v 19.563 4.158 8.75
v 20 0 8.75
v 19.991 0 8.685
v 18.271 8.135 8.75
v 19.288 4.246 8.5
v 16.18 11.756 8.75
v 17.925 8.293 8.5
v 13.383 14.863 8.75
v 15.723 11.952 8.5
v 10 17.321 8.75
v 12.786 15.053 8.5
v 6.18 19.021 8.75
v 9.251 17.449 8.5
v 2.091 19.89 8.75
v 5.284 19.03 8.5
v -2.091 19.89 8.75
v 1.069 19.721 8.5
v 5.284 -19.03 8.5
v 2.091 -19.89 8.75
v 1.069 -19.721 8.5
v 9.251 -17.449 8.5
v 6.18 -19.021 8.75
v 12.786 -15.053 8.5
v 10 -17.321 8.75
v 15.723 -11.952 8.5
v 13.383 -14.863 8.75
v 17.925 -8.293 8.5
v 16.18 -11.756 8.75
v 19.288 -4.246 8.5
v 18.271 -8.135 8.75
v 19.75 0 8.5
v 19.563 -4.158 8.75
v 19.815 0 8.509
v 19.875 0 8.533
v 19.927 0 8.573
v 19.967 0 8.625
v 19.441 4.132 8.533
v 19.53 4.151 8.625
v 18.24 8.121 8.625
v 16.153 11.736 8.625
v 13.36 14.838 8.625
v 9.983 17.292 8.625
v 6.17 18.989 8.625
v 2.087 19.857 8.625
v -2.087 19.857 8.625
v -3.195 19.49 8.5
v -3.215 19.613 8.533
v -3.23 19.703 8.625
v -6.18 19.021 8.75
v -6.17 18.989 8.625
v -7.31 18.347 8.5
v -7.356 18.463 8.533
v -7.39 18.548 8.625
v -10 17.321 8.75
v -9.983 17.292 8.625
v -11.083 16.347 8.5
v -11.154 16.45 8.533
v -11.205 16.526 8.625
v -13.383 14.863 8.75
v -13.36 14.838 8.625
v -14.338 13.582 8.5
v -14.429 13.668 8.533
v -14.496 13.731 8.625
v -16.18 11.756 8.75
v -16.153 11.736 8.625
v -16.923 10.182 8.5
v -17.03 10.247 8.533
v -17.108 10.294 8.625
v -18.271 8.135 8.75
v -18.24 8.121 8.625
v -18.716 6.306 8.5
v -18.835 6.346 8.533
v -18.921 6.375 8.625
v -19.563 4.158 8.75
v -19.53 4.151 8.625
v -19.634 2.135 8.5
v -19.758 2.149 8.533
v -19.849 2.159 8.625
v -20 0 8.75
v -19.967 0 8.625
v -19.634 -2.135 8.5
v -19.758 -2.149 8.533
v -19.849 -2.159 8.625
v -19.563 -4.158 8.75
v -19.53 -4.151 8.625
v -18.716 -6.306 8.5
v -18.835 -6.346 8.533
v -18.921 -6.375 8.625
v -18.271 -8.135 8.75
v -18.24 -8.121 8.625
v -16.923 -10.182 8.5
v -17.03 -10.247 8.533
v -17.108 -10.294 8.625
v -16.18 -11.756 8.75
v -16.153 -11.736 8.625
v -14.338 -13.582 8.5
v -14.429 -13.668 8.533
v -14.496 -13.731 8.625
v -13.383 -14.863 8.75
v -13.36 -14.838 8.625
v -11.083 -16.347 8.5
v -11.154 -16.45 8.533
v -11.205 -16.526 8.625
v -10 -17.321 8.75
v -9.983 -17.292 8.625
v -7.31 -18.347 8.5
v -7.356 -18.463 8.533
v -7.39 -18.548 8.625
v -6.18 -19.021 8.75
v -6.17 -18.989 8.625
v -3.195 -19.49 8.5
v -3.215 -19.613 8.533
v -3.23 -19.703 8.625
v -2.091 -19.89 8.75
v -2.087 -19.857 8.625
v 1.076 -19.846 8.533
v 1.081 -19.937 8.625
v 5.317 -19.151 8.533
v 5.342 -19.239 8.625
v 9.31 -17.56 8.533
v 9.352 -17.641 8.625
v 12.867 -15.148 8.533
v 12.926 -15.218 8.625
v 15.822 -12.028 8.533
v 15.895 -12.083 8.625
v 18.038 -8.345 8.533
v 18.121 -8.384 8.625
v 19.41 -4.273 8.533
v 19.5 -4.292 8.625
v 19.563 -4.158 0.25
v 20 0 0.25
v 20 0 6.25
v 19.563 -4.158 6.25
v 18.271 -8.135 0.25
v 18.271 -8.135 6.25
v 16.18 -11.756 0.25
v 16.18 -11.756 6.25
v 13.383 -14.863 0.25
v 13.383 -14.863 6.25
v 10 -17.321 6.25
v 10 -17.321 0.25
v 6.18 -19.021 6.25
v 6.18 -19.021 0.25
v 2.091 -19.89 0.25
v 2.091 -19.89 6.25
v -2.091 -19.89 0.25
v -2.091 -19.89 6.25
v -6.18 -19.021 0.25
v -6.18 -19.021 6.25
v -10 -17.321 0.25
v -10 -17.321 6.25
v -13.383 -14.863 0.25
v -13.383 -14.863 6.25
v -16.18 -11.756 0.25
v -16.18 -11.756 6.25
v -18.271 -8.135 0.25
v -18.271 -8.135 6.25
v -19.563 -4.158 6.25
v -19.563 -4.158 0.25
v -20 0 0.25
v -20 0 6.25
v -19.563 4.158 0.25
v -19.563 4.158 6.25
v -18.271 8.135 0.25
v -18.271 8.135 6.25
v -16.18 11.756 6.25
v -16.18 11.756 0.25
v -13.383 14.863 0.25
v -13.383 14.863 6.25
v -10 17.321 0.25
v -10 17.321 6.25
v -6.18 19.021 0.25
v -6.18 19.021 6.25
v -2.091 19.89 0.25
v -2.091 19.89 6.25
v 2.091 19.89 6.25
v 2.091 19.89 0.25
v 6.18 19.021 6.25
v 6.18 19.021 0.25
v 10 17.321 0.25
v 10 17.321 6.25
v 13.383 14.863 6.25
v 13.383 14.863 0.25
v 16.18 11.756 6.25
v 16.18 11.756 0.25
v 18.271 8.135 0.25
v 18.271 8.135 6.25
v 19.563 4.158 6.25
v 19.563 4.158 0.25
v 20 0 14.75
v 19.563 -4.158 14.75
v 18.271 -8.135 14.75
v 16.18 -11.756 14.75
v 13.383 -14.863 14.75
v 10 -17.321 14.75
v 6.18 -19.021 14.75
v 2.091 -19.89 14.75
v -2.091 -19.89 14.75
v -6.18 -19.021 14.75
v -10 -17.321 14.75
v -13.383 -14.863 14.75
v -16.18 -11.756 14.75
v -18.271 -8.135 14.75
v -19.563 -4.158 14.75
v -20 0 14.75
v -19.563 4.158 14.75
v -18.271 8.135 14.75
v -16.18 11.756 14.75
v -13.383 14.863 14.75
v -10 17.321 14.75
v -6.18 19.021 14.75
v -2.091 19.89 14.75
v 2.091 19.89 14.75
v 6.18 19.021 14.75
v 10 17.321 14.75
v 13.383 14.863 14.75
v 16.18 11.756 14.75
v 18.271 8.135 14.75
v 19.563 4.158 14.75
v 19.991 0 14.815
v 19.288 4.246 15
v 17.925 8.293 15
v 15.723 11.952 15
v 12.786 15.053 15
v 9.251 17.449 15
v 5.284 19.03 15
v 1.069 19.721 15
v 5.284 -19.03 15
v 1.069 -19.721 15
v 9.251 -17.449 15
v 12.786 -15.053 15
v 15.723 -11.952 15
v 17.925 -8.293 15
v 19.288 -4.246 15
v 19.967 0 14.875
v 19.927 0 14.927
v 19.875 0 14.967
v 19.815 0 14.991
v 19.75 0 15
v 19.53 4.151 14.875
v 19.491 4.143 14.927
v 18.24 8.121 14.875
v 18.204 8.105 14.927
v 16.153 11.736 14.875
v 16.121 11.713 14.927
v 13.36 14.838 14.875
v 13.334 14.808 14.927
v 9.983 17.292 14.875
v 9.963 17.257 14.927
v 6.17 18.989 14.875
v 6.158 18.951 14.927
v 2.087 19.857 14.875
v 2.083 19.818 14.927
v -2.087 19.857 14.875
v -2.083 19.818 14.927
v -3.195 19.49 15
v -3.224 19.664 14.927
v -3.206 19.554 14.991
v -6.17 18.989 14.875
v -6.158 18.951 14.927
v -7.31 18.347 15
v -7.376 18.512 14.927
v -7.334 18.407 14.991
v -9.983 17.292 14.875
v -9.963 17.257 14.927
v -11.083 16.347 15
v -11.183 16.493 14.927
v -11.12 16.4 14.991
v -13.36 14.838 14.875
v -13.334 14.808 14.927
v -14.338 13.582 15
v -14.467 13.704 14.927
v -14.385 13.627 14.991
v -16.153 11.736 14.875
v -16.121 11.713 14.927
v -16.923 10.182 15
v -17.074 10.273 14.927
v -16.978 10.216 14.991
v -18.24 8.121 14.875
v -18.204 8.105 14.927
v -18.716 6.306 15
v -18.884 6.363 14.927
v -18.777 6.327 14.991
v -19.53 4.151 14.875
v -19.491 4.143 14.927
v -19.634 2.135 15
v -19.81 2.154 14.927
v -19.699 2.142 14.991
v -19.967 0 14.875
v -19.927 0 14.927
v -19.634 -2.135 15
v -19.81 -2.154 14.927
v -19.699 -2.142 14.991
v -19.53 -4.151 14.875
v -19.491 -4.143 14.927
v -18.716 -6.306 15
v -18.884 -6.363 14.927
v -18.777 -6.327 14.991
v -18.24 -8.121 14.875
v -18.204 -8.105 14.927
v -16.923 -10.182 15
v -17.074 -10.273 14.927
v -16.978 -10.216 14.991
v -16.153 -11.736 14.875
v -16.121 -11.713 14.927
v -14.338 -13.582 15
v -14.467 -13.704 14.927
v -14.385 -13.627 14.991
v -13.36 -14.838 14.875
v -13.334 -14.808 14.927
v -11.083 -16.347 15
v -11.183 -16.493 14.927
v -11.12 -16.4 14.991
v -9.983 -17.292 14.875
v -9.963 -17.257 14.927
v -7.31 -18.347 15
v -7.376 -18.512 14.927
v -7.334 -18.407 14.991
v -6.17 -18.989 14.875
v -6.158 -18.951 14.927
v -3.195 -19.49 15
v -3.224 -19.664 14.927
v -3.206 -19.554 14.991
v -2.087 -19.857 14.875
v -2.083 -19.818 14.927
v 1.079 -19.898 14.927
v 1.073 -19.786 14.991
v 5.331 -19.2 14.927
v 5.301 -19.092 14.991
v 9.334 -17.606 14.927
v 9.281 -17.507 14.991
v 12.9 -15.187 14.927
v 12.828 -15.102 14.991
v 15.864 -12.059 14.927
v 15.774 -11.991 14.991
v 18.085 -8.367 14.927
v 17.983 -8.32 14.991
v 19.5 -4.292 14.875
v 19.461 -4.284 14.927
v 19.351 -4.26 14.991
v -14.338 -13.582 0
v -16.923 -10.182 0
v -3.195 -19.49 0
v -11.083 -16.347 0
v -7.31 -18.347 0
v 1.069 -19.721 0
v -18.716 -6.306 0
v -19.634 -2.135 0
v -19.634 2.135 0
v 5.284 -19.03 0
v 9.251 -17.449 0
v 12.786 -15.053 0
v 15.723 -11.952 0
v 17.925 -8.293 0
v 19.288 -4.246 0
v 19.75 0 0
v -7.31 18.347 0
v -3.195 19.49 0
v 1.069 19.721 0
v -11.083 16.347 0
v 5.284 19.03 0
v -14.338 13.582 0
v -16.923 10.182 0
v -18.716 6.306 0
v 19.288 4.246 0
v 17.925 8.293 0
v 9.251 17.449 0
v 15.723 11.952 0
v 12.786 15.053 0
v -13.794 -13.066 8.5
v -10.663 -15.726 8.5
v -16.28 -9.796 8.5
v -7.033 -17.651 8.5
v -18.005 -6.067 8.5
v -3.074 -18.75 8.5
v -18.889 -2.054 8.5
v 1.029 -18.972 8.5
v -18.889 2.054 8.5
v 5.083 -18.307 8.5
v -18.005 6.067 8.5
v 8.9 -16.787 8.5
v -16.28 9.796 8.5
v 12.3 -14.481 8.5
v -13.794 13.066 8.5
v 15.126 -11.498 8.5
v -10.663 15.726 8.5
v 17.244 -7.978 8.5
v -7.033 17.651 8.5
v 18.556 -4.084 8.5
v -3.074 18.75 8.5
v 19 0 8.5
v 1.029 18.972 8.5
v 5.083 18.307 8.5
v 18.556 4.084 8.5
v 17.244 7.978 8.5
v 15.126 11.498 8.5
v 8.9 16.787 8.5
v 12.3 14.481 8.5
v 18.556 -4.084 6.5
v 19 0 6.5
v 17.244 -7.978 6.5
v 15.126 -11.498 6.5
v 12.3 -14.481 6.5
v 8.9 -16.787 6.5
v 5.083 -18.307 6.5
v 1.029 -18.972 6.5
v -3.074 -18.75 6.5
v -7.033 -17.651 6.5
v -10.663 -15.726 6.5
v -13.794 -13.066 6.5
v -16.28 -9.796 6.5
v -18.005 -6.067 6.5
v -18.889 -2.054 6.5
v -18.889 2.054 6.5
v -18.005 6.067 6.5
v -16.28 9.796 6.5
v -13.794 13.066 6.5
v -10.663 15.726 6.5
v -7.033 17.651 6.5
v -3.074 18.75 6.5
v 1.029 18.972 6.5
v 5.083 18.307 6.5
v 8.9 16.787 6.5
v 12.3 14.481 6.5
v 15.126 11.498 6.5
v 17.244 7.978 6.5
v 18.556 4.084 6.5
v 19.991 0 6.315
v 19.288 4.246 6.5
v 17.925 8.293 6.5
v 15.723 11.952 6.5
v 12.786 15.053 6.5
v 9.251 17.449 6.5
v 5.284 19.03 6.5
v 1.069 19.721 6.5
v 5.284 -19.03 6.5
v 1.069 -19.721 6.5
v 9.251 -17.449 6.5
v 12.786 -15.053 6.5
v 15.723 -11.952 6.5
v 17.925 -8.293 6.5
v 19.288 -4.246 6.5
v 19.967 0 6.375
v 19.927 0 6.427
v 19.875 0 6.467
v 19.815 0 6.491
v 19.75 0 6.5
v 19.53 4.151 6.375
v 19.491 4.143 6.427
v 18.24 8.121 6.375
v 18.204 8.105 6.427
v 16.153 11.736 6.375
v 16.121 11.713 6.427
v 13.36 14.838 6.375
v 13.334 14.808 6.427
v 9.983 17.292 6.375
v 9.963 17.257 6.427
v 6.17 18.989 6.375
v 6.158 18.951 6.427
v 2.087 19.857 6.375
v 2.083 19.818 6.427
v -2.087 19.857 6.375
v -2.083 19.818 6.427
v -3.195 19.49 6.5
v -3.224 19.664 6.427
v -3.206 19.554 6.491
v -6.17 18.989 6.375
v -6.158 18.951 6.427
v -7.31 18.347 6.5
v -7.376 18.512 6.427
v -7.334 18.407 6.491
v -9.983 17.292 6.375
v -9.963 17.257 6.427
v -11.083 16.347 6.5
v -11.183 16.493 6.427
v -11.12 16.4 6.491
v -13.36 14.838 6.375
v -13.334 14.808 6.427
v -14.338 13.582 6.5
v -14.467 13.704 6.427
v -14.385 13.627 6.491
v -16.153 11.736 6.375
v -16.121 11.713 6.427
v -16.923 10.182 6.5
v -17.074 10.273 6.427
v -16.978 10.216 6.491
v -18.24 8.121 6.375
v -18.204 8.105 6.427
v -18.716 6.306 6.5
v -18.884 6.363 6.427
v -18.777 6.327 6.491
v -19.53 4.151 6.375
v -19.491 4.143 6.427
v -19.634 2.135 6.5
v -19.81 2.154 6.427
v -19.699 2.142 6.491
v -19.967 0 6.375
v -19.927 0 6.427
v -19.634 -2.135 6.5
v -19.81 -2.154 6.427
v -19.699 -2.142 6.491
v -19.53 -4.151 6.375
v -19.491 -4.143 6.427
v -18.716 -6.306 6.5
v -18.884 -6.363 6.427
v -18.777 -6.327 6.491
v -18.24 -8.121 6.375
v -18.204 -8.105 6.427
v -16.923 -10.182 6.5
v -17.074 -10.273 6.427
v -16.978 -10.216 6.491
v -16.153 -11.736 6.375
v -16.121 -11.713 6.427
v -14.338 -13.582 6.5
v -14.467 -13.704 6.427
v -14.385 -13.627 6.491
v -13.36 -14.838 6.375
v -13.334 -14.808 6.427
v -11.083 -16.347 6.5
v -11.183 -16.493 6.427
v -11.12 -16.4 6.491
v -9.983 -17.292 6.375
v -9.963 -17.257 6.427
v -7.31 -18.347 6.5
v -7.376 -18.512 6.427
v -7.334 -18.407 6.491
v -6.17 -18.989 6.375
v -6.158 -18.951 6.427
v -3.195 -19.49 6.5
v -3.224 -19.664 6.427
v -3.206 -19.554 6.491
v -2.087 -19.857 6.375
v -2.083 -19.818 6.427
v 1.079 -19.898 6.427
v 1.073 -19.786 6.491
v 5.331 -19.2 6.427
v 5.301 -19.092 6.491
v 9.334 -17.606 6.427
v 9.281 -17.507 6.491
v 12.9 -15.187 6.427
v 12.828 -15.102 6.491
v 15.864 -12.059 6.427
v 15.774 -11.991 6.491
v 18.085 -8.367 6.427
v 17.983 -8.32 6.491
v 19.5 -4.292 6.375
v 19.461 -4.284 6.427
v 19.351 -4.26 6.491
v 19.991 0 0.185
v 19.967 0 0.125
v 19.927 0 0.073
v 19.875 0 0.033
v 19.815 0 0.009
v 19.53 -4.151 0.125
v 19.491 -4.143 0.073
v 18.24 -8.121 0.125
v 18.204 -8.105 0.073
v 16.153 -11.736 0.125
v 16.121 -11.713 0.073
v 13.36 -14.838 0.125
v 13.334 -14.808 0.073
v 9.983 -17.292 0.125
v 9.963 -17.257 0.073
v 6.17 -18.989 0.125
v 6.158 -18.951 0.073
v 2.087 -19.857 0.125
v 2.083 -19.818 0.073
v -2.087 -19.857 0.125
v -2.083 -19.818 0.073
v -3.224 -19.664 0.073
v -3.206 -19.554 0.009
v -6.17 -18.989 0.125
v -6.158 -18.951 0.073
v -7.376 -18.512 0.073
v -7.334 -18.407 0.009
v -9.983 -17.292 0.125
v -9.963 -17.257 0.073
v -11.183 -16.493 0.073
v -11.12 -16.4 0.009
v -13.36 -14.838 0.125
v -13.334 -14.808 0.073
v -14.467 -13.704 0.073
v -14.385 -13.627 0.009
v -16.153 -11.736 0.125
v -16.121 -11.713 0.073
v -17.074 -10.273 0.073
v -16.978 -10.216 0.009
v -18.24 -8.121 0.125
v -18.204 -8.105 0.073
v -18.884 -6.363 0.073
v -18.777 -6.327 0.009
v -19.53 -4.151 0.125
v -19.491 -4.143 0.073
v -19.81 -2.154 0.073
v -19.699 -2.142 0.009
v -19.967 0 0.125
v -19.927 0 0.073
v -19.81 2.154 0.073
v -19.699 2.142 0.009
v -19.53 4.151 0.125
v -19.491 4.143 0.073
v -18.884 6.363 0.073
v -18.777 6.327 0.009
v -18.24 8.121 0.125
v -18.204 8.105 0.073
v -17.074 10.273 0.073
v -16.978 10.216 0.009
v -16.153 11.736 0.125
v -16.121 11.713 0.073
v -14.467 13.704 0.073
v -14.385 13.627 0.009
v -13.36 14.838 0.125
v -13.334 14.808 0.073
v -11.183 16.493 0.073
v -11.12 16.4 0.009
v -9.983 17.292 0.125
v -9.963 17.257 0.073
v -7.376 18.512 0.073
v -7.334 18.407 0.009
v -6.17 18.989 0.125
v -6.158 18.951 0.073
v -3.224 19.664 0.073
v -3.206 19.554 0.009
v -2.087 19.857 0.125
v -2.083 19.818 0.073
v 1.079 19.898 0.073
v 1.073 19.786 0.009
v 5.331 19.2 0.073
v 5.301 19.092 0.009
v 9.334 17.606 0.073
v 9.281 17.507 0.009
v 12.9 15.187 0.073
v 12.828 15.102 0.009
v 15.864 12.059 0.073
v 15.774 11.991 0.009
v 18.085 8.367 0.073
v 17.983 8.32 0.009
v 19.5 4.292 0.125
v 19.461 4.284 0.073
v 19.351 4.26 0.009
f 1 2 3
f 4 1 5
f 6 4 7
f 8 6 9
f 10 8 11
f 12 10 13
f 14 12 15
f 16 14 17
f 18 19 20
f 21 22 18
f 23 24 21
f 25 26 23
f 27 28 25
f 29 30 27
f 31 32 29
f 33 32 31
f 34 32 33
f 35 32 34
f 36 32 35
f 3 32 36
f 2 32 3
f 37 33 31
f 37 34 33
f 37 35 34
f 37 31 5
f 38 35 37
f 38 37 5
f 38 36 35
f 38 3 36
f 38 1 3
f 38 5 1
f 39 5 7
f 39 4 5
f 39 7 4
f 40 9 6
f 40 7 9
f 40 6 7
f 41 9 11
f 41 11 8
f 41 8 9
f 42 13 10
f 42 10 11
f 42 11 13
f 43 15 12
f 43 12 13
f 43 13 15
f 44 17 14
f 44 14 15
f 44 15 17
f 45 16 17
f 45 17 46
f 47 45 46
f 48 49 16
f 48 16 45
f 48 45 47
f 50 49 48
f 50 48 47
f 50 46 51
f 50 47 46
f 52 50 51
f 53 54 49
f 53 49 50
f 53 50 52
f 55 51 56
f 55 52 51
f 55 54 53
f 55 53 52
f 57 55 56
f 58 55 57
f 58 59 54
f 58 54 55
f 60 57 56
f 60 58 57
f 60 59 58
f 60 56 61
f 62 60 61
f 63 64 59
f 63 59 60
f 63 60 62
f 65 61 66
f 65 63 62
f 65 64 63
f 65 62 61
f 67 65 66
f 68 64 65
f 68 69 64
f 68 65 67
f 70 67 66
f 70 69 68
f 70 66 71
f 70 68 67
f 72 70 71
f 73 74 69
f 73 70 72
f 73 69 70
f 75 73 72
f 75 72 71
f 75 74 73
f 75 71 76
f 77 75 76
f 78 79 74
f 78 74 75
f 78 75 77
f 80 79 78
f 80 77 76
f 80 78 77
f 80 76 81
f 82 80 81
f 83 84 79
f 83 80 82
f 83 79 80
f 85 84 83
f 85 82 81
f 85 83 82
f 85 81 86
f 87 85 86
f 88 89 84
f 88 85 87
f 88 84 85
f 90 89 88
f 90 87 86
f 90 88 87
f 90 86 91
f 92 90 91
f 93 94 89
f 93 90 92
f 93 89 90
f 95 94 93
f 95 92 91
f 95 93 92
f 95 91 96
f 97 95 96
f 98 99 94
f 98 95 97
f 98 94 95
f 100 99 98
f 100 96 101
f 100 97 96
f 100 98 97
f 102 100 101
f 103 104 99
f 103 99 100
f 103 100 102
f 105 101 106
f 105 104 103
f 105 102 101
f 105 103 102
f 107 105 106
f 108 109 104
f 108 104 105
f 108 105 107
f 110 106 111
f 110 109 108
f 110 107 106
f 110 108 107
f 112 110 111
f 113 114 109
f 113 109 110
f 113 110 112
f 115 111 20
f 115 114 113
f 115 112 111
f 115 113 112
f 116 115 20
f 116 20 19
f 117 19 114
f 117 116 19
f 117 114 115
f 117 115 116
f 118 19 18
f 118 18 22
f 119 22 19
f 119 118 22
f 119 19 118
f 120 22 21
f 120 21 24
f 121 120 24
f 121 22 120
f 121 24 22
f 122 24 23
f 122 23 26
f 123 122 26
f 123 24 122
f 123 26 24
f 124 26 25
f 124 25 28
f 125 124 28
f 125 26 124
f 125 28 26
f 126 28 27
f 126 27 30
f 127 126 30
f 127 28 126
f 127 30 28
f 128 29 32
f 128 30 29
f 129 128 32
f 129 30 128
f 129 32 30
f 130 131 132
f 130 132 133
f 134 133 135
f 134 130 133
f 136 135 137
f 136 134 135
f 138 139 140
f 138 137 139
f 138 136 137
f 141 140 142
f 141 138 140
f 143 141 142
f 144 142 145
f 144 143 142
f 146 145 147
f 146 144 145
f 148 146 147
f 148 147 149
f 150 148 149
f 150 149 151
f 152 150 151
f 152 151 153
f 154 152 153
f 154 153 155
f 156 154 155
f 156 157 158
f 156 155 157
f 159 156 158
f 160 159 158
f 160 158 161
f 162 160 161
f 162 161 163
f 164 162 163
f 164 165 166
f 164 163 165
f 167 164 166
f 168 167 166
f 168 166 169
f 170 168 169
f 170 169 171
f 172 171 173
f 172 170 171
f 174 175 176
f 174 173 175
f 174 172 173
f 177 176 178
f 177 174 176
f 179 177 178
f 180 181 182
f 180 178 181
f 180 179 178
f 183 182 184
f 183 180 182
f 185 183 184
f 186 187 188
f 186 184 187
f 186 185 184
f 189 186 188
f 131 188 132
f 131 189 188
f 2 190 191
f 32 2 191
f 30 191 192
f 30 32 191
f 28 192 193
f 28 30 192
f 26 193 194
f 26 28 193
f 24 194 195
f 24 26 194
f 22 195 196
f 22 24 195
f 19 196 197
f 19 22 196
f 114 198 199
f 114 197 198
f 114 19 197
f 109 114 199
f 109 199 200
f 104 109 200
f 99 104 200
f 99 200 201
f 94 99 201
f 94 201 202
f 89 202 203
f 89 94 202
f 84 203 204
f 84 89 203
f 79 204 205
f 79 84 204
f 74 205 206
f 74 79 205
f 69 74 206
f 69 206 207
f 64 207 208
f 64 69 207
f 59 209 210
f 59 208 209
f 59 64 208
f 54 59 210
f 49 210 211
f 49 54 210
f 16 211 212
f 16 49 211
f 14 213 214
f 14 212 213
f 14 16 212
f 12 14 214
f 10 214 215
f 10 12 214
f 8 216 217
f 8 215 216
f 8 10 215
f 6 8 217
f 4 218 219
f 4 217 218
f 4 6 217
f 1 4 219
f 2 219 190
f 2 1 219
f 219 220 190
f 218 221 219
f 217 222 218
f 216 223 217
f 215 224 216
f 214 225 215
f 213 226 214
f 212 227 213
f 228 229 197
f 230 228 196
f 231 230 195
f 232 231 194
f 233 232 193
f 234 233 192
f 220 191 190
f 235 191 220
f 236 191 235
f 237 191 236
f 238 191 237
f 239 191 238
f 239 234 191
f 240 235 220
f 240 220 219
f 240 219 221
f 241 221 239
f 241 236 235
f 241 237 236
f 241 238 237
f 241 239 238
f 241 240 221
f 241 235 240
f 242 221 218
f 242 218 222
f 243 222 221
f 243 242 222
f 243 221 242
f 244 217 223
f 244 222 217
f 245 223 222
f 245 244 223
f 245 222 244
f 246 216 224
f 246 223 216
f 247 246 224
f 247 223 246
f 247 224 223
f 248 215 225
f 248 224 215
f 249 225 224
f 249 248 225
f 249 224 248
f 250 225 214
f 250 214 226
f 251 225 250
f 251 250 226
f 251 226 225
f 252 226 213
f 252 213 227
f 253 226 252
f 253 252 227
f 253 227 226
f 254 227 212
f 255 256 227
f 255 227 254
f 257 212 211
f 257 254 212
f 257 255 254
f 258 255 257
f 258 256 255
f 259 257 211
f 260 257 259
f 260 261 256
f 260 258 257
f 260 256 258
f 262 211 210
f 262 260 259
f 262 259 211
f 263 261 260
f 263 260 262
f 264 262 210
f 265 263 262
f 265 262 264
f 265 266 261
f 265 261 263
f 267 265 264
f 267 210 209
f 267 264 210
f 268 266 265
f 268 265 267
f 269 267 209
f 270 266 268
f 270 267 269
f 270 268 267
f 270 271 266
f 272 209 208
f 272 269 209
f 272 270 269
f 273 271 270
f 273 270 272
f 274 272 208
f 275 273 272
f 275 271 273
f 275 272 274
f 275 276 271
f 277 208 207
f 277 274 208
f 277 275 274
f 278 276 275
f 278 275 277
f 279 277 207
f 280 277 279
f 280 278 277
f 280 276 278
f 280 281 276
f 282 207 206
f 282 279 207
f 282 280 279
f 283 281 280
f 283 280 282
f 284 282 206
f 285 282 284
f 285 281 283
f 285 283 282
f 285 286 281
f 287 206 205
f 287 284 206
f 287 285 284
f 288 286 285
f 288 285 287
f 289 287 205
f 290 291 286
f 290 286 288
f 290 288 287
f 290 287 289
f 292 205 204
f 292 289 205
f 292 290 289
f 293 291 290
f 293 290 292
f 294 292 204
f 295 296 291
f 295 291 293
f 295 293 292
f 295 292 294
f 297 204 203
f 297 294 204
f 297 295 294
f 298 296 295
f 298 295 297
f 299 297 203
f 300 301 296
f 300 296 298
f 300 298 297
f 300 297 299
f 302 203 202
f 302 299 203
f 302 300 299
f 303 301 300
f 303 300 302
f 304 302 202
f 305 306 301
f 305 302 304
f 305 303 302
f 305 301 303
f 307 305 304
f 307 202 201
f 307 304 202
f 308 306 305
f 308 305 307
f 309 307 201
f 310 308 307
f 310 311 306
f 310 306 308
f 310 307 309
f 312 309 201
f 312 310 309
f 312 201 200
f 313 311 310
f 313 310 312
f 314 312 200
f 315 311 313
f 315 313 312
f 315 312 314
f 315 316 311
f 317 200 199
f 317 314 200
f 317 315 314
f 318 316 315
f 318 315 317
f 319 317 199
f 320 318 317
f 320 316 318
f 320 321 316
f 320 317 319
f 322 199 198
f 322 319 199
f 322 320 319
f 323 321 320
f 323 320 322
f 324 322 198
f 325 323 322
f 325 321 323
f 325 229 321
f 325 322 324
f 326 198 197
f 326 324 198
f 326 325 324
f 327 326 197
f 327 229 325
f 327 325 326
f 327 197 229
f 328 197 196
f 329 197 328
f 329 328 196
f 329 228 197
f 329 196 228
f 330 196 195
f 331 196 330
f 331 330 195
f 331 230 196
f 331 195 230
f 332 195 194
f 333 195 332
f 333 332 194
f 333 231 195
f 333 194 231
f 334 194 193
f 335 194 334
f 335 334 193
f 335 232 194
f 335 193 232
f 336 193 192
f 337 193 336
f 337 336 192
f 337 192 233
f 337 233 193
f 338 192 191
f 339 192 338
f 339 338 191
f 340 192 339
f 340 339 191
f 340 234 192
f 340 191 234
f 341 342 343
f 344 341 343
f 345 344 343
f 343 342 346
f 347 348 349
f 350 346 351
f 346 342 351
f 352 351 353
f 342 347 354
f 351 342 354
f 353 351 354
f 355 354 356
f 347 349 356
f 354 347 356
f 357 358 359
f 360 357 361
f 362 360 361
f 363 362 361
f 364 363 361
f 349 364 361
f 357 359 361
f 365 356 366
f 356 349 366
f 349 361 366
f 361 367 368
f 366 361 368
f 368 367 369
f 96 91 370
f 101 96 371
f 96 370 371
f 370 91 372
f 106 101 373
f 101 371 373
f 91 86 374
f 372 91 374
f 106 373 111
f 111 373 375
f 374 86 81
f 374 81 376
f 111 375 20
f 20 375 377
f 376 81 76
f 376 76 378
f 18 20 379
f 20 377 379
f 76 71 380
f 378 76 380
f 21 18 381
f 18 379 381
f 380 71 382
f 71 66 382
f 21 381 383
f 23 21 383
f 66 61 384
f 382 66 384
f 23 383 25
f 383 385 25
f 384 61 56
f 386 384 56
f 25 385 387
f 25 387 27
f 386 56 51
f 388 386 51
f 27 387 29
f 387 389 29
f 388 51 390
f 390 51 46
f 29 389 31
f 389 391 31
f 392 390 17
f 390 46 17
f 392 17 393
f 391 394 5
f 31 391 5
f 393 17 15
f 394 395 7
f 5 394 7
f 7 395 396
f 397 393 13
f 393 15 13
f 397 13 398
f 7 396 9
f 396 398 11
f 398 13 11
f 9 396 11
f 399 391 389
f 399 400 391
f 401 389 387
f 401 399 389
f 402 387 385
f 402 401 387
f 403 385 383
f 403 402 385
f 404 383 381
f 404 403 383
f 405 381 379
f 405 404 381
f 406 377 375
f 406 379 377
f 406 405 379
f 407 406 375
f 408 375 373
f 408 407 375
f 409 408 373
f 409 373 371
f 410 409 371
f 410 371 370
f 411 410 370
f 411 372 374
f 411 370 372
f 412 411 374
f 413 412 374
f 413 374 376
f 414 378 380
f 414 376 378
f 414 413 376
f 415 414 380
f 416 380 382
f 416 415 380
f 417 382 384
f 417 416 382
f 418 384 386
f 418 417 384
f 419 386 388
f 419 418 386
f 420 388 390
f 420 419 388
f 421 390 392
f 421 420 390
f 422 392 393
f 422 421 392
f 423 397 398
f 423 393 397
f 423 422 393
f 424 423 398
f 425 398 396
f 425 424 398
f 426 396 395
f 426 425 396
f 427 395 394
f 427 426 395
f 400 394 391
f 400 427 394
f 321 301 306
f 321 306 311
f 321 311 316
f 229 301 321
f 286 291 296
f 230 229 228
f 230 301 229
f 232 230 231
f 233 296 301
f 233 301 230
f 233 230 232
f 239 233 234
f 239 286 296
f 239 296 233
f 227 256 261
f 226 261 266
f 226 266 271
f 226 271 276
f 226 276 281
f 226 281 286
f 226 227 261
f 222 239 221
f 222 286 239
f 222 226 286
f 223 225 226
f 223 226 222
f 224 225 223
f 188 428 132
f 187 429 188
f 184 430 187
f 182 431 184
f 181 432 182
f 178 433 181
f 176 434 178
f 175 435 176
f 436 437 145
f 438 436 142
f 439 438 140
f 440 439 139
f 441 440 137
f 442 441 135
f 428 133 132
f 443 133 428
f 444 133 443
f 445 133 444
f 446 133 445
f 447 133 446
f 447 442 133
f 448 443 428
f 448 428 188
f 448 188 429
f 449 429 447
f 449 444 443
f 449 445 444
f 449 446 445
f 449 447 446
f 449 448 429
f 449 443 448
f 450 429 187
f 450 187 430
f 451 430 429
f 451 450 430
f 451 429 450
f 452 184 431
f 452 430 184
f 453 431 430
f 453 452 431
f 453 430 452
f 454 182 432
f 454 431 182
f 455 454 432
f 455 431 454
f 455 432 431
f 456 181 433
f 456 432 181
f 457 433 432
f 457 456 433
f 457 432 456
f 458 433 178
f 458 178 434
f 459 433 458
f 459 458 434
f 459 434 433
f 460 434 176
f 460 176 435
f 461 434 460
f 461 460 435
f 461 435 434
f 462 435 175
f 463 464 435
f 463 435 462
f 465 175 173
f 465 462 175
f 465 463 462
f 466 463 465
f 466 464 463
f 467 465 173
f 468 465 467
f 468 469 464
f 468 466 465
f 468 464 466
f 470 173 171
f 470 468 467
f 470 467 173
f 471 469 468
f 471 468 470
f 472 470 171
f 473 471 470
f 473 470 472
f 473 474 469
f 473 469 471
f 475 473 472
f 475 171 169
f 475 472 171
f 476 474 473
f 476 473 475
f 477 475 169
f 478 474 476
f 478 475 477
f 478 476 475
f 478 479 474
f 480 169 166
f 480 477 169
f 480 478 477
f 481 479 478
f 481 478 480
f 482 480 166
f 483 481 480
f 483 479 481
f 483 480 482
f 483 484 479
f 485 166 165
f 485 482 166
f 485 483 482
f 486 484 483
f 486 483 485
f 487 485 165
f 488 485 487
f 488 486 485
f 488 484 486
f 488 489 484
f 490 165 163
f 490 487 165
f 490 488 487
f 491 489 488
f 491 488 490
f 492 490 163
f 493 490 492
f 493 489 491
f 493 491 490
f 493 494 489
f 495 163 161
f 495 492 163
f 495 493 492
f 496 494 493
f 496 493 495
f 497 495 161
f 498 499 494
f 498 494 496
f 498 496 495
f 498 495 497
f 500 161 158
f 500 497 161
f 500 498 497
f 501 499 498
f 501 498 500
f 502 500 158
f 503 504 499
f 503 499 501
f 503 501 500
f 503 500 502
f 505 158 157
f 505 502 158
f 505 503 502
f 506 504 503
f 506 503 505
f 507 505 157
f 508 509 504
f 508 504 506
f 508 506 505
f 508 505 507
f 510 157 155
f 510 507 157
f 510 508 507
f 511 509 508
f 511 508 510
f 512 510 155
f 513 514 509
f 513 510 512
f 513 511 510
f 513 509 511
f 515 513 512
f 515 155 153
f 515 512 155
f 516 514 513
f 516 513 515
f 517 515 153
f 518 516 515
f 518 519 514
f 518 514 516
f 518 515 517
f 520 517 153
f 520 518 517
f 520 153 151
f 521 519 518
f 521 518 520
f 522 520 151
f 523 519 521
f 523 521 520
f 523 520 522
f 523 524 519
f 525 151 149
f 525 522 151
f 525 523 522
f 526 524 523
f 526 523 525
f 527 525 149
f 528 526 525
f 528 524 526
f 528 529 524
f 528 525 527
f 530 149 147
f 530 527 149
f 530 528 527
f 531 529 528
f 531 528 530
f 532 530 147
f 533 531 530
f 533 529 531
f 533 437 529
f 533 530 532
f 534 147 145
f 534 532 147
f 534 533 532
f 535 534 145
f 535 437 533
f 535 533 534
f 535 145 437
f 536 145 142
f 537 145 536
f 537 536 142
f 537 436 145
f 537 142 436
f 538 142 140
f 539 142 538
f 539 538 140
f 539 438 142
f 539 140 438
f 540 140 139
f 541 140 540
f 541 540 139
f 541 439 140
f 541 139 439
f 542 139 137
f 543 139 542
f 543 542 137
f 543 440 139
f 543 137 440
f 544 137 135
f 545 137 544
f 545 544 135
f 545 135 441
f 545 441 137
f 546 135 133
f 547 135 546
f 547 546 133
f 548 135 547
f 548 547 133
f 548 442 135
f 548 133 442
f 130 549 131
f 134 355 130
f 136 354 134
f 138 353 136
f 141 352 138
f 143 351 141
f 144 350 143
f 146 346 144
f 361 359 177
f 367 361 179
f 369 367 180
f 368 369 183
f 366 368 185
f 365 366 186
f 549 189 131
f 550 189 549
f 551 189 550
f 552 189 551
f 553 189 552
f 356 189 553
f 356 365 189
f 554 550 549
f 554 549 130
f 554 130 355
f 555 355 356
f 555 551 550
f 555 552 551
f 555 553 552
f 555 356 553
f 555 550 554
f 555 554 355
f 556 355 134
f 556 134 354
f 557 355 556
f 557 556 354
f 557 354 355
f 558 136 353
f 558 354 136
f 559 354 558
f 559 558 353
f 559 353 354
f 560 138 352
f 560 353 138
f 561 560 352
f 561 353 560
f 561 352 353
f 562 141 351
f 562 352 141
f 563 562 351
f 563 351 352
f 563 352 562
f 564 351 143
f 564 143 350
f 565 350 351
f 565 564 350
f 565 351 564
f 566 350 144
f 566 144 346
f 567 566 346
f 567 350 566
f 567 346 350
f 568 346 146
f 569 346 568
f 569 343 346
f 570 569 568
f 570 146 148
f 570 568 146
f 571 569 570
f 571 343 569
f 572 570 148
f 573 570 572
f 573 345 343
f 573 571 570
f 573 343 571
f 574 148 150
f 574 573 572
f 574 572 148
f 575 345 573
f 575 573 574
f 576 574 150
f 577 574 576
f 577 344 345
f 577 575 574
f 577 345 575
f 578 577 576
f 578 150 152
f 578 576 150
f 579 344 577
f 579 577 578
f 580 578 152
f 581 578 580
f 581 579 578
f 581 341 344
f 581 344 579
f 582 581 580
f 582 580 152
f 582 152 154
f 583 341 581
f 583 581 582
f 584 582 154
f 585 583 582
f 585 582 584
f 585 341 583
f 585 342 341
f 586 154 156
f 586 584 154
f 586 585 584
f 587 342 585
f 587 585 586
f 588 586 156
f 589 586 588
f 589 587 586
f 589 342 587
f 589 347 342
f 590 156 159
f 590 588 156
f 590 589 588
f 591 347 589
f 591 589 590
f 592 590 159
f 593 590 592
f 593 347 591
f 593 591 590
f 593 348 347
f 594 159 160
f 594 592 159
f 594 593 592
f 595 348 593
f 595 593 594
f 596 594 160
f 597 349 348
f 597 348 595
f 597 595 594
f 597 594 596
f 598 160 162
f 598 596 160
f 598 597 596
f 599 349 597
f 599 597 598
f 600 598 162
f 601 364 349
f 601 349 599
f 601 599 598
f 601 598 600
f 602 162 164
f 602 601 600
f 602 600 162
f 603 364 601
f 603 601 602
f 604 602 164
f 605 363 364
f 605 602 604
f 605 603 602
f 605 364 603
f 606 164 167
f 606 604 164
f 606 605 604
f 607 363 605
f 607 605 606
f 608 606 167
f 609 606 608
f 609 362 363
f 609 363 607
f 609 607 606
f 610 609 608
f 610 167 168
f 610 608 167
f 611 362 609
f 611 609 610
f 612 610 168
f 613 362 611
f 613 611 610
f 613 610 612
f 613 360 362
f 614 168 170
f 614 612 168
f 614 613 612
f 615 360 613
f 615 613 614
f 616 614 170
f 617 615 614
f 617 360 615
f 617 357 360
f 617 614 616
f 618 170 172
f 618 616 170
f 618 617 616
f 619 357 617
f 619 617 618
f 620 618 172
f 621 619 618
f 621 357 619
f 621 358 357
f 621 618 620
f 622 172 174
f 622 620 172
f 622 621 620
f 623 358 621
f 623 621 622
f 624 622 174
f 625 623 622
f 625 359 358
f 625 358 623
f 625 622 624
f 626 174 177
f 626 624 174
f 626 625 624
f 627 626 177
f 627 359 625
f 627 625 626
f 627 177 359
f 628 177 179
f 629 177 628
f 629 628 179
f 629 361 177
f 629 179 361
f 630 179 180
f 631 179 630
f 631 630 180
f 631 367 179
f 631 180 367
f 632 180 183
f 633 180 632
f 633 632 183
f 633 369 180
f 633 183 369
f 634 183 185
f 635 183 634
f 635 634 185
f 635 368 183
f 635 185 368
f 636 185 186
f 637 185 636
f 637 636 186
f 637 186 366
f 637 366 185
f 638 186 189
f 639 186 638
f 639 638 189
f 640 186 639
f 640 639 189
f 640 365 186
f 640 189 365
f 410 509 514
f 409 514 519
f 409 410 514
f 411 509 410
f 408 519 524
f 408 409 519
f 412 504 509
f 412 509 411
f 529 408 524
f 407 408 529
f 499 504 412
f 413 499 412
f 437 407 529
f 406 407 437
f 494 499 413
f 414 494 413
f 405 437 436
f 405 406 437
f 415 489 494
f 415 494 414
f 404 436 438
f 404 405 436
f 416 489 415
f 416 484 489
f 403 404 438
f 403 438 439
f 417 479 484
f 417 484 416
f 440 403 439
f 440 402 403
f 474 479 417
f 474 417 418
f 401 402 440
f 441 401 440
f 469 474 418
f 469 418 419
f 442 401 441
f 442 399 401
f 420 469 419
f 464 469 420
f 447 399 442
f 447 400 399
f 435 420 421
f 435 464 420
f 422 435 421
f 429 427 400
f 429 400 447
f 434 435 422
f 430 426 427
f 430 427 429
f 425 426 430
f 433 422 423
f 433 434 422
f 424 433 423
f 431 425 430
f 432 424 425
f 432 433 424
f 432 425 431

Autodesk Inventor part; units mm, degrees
ref_plane "YZ Plane" through (0, 0, 0) normal (1, 0, 0) x (0, 1, 0)
ref_plane "XZ Plane" through (0, 0, 0) normal (0, 1, 0) x (-1, 0, 0)
sketch "Sketch1" plane through (0, 0, 0) normal (0, 0, 1) x (1, 0, 0)
  circle A0 centre (0, 0) radius 20
  dimension "d0" = 40
extrude "Extrusion1" add sketch "Sketch1" along normal blind 15
ref_plane "Work Plane1" through (0, 0, 6.5) normal (0, 0, 1) x (1, 0, 0)
sketch "Sketch2" plane through (0, 0, 6.5) normal (0, 0, 1) x (1, 0, 0)
  circle A0 centre (0, 0) radius 20 projected
  circle A1 centre (0, 0) radius 20 projected
  circle A2 centre (0, 0) radius 19
  dimension "d4" = 38
extrude "Extrusion2" cut sketch "Sketch2" along normal blind 2
fillet "Fillet1" radius 0.25 4 edges at (-20, 0, 6.5) (-20, 0, 8.5) (-20, 0, 0) (-20, 0, 15)
properties part number "Encoder Mount Hole Plug"
